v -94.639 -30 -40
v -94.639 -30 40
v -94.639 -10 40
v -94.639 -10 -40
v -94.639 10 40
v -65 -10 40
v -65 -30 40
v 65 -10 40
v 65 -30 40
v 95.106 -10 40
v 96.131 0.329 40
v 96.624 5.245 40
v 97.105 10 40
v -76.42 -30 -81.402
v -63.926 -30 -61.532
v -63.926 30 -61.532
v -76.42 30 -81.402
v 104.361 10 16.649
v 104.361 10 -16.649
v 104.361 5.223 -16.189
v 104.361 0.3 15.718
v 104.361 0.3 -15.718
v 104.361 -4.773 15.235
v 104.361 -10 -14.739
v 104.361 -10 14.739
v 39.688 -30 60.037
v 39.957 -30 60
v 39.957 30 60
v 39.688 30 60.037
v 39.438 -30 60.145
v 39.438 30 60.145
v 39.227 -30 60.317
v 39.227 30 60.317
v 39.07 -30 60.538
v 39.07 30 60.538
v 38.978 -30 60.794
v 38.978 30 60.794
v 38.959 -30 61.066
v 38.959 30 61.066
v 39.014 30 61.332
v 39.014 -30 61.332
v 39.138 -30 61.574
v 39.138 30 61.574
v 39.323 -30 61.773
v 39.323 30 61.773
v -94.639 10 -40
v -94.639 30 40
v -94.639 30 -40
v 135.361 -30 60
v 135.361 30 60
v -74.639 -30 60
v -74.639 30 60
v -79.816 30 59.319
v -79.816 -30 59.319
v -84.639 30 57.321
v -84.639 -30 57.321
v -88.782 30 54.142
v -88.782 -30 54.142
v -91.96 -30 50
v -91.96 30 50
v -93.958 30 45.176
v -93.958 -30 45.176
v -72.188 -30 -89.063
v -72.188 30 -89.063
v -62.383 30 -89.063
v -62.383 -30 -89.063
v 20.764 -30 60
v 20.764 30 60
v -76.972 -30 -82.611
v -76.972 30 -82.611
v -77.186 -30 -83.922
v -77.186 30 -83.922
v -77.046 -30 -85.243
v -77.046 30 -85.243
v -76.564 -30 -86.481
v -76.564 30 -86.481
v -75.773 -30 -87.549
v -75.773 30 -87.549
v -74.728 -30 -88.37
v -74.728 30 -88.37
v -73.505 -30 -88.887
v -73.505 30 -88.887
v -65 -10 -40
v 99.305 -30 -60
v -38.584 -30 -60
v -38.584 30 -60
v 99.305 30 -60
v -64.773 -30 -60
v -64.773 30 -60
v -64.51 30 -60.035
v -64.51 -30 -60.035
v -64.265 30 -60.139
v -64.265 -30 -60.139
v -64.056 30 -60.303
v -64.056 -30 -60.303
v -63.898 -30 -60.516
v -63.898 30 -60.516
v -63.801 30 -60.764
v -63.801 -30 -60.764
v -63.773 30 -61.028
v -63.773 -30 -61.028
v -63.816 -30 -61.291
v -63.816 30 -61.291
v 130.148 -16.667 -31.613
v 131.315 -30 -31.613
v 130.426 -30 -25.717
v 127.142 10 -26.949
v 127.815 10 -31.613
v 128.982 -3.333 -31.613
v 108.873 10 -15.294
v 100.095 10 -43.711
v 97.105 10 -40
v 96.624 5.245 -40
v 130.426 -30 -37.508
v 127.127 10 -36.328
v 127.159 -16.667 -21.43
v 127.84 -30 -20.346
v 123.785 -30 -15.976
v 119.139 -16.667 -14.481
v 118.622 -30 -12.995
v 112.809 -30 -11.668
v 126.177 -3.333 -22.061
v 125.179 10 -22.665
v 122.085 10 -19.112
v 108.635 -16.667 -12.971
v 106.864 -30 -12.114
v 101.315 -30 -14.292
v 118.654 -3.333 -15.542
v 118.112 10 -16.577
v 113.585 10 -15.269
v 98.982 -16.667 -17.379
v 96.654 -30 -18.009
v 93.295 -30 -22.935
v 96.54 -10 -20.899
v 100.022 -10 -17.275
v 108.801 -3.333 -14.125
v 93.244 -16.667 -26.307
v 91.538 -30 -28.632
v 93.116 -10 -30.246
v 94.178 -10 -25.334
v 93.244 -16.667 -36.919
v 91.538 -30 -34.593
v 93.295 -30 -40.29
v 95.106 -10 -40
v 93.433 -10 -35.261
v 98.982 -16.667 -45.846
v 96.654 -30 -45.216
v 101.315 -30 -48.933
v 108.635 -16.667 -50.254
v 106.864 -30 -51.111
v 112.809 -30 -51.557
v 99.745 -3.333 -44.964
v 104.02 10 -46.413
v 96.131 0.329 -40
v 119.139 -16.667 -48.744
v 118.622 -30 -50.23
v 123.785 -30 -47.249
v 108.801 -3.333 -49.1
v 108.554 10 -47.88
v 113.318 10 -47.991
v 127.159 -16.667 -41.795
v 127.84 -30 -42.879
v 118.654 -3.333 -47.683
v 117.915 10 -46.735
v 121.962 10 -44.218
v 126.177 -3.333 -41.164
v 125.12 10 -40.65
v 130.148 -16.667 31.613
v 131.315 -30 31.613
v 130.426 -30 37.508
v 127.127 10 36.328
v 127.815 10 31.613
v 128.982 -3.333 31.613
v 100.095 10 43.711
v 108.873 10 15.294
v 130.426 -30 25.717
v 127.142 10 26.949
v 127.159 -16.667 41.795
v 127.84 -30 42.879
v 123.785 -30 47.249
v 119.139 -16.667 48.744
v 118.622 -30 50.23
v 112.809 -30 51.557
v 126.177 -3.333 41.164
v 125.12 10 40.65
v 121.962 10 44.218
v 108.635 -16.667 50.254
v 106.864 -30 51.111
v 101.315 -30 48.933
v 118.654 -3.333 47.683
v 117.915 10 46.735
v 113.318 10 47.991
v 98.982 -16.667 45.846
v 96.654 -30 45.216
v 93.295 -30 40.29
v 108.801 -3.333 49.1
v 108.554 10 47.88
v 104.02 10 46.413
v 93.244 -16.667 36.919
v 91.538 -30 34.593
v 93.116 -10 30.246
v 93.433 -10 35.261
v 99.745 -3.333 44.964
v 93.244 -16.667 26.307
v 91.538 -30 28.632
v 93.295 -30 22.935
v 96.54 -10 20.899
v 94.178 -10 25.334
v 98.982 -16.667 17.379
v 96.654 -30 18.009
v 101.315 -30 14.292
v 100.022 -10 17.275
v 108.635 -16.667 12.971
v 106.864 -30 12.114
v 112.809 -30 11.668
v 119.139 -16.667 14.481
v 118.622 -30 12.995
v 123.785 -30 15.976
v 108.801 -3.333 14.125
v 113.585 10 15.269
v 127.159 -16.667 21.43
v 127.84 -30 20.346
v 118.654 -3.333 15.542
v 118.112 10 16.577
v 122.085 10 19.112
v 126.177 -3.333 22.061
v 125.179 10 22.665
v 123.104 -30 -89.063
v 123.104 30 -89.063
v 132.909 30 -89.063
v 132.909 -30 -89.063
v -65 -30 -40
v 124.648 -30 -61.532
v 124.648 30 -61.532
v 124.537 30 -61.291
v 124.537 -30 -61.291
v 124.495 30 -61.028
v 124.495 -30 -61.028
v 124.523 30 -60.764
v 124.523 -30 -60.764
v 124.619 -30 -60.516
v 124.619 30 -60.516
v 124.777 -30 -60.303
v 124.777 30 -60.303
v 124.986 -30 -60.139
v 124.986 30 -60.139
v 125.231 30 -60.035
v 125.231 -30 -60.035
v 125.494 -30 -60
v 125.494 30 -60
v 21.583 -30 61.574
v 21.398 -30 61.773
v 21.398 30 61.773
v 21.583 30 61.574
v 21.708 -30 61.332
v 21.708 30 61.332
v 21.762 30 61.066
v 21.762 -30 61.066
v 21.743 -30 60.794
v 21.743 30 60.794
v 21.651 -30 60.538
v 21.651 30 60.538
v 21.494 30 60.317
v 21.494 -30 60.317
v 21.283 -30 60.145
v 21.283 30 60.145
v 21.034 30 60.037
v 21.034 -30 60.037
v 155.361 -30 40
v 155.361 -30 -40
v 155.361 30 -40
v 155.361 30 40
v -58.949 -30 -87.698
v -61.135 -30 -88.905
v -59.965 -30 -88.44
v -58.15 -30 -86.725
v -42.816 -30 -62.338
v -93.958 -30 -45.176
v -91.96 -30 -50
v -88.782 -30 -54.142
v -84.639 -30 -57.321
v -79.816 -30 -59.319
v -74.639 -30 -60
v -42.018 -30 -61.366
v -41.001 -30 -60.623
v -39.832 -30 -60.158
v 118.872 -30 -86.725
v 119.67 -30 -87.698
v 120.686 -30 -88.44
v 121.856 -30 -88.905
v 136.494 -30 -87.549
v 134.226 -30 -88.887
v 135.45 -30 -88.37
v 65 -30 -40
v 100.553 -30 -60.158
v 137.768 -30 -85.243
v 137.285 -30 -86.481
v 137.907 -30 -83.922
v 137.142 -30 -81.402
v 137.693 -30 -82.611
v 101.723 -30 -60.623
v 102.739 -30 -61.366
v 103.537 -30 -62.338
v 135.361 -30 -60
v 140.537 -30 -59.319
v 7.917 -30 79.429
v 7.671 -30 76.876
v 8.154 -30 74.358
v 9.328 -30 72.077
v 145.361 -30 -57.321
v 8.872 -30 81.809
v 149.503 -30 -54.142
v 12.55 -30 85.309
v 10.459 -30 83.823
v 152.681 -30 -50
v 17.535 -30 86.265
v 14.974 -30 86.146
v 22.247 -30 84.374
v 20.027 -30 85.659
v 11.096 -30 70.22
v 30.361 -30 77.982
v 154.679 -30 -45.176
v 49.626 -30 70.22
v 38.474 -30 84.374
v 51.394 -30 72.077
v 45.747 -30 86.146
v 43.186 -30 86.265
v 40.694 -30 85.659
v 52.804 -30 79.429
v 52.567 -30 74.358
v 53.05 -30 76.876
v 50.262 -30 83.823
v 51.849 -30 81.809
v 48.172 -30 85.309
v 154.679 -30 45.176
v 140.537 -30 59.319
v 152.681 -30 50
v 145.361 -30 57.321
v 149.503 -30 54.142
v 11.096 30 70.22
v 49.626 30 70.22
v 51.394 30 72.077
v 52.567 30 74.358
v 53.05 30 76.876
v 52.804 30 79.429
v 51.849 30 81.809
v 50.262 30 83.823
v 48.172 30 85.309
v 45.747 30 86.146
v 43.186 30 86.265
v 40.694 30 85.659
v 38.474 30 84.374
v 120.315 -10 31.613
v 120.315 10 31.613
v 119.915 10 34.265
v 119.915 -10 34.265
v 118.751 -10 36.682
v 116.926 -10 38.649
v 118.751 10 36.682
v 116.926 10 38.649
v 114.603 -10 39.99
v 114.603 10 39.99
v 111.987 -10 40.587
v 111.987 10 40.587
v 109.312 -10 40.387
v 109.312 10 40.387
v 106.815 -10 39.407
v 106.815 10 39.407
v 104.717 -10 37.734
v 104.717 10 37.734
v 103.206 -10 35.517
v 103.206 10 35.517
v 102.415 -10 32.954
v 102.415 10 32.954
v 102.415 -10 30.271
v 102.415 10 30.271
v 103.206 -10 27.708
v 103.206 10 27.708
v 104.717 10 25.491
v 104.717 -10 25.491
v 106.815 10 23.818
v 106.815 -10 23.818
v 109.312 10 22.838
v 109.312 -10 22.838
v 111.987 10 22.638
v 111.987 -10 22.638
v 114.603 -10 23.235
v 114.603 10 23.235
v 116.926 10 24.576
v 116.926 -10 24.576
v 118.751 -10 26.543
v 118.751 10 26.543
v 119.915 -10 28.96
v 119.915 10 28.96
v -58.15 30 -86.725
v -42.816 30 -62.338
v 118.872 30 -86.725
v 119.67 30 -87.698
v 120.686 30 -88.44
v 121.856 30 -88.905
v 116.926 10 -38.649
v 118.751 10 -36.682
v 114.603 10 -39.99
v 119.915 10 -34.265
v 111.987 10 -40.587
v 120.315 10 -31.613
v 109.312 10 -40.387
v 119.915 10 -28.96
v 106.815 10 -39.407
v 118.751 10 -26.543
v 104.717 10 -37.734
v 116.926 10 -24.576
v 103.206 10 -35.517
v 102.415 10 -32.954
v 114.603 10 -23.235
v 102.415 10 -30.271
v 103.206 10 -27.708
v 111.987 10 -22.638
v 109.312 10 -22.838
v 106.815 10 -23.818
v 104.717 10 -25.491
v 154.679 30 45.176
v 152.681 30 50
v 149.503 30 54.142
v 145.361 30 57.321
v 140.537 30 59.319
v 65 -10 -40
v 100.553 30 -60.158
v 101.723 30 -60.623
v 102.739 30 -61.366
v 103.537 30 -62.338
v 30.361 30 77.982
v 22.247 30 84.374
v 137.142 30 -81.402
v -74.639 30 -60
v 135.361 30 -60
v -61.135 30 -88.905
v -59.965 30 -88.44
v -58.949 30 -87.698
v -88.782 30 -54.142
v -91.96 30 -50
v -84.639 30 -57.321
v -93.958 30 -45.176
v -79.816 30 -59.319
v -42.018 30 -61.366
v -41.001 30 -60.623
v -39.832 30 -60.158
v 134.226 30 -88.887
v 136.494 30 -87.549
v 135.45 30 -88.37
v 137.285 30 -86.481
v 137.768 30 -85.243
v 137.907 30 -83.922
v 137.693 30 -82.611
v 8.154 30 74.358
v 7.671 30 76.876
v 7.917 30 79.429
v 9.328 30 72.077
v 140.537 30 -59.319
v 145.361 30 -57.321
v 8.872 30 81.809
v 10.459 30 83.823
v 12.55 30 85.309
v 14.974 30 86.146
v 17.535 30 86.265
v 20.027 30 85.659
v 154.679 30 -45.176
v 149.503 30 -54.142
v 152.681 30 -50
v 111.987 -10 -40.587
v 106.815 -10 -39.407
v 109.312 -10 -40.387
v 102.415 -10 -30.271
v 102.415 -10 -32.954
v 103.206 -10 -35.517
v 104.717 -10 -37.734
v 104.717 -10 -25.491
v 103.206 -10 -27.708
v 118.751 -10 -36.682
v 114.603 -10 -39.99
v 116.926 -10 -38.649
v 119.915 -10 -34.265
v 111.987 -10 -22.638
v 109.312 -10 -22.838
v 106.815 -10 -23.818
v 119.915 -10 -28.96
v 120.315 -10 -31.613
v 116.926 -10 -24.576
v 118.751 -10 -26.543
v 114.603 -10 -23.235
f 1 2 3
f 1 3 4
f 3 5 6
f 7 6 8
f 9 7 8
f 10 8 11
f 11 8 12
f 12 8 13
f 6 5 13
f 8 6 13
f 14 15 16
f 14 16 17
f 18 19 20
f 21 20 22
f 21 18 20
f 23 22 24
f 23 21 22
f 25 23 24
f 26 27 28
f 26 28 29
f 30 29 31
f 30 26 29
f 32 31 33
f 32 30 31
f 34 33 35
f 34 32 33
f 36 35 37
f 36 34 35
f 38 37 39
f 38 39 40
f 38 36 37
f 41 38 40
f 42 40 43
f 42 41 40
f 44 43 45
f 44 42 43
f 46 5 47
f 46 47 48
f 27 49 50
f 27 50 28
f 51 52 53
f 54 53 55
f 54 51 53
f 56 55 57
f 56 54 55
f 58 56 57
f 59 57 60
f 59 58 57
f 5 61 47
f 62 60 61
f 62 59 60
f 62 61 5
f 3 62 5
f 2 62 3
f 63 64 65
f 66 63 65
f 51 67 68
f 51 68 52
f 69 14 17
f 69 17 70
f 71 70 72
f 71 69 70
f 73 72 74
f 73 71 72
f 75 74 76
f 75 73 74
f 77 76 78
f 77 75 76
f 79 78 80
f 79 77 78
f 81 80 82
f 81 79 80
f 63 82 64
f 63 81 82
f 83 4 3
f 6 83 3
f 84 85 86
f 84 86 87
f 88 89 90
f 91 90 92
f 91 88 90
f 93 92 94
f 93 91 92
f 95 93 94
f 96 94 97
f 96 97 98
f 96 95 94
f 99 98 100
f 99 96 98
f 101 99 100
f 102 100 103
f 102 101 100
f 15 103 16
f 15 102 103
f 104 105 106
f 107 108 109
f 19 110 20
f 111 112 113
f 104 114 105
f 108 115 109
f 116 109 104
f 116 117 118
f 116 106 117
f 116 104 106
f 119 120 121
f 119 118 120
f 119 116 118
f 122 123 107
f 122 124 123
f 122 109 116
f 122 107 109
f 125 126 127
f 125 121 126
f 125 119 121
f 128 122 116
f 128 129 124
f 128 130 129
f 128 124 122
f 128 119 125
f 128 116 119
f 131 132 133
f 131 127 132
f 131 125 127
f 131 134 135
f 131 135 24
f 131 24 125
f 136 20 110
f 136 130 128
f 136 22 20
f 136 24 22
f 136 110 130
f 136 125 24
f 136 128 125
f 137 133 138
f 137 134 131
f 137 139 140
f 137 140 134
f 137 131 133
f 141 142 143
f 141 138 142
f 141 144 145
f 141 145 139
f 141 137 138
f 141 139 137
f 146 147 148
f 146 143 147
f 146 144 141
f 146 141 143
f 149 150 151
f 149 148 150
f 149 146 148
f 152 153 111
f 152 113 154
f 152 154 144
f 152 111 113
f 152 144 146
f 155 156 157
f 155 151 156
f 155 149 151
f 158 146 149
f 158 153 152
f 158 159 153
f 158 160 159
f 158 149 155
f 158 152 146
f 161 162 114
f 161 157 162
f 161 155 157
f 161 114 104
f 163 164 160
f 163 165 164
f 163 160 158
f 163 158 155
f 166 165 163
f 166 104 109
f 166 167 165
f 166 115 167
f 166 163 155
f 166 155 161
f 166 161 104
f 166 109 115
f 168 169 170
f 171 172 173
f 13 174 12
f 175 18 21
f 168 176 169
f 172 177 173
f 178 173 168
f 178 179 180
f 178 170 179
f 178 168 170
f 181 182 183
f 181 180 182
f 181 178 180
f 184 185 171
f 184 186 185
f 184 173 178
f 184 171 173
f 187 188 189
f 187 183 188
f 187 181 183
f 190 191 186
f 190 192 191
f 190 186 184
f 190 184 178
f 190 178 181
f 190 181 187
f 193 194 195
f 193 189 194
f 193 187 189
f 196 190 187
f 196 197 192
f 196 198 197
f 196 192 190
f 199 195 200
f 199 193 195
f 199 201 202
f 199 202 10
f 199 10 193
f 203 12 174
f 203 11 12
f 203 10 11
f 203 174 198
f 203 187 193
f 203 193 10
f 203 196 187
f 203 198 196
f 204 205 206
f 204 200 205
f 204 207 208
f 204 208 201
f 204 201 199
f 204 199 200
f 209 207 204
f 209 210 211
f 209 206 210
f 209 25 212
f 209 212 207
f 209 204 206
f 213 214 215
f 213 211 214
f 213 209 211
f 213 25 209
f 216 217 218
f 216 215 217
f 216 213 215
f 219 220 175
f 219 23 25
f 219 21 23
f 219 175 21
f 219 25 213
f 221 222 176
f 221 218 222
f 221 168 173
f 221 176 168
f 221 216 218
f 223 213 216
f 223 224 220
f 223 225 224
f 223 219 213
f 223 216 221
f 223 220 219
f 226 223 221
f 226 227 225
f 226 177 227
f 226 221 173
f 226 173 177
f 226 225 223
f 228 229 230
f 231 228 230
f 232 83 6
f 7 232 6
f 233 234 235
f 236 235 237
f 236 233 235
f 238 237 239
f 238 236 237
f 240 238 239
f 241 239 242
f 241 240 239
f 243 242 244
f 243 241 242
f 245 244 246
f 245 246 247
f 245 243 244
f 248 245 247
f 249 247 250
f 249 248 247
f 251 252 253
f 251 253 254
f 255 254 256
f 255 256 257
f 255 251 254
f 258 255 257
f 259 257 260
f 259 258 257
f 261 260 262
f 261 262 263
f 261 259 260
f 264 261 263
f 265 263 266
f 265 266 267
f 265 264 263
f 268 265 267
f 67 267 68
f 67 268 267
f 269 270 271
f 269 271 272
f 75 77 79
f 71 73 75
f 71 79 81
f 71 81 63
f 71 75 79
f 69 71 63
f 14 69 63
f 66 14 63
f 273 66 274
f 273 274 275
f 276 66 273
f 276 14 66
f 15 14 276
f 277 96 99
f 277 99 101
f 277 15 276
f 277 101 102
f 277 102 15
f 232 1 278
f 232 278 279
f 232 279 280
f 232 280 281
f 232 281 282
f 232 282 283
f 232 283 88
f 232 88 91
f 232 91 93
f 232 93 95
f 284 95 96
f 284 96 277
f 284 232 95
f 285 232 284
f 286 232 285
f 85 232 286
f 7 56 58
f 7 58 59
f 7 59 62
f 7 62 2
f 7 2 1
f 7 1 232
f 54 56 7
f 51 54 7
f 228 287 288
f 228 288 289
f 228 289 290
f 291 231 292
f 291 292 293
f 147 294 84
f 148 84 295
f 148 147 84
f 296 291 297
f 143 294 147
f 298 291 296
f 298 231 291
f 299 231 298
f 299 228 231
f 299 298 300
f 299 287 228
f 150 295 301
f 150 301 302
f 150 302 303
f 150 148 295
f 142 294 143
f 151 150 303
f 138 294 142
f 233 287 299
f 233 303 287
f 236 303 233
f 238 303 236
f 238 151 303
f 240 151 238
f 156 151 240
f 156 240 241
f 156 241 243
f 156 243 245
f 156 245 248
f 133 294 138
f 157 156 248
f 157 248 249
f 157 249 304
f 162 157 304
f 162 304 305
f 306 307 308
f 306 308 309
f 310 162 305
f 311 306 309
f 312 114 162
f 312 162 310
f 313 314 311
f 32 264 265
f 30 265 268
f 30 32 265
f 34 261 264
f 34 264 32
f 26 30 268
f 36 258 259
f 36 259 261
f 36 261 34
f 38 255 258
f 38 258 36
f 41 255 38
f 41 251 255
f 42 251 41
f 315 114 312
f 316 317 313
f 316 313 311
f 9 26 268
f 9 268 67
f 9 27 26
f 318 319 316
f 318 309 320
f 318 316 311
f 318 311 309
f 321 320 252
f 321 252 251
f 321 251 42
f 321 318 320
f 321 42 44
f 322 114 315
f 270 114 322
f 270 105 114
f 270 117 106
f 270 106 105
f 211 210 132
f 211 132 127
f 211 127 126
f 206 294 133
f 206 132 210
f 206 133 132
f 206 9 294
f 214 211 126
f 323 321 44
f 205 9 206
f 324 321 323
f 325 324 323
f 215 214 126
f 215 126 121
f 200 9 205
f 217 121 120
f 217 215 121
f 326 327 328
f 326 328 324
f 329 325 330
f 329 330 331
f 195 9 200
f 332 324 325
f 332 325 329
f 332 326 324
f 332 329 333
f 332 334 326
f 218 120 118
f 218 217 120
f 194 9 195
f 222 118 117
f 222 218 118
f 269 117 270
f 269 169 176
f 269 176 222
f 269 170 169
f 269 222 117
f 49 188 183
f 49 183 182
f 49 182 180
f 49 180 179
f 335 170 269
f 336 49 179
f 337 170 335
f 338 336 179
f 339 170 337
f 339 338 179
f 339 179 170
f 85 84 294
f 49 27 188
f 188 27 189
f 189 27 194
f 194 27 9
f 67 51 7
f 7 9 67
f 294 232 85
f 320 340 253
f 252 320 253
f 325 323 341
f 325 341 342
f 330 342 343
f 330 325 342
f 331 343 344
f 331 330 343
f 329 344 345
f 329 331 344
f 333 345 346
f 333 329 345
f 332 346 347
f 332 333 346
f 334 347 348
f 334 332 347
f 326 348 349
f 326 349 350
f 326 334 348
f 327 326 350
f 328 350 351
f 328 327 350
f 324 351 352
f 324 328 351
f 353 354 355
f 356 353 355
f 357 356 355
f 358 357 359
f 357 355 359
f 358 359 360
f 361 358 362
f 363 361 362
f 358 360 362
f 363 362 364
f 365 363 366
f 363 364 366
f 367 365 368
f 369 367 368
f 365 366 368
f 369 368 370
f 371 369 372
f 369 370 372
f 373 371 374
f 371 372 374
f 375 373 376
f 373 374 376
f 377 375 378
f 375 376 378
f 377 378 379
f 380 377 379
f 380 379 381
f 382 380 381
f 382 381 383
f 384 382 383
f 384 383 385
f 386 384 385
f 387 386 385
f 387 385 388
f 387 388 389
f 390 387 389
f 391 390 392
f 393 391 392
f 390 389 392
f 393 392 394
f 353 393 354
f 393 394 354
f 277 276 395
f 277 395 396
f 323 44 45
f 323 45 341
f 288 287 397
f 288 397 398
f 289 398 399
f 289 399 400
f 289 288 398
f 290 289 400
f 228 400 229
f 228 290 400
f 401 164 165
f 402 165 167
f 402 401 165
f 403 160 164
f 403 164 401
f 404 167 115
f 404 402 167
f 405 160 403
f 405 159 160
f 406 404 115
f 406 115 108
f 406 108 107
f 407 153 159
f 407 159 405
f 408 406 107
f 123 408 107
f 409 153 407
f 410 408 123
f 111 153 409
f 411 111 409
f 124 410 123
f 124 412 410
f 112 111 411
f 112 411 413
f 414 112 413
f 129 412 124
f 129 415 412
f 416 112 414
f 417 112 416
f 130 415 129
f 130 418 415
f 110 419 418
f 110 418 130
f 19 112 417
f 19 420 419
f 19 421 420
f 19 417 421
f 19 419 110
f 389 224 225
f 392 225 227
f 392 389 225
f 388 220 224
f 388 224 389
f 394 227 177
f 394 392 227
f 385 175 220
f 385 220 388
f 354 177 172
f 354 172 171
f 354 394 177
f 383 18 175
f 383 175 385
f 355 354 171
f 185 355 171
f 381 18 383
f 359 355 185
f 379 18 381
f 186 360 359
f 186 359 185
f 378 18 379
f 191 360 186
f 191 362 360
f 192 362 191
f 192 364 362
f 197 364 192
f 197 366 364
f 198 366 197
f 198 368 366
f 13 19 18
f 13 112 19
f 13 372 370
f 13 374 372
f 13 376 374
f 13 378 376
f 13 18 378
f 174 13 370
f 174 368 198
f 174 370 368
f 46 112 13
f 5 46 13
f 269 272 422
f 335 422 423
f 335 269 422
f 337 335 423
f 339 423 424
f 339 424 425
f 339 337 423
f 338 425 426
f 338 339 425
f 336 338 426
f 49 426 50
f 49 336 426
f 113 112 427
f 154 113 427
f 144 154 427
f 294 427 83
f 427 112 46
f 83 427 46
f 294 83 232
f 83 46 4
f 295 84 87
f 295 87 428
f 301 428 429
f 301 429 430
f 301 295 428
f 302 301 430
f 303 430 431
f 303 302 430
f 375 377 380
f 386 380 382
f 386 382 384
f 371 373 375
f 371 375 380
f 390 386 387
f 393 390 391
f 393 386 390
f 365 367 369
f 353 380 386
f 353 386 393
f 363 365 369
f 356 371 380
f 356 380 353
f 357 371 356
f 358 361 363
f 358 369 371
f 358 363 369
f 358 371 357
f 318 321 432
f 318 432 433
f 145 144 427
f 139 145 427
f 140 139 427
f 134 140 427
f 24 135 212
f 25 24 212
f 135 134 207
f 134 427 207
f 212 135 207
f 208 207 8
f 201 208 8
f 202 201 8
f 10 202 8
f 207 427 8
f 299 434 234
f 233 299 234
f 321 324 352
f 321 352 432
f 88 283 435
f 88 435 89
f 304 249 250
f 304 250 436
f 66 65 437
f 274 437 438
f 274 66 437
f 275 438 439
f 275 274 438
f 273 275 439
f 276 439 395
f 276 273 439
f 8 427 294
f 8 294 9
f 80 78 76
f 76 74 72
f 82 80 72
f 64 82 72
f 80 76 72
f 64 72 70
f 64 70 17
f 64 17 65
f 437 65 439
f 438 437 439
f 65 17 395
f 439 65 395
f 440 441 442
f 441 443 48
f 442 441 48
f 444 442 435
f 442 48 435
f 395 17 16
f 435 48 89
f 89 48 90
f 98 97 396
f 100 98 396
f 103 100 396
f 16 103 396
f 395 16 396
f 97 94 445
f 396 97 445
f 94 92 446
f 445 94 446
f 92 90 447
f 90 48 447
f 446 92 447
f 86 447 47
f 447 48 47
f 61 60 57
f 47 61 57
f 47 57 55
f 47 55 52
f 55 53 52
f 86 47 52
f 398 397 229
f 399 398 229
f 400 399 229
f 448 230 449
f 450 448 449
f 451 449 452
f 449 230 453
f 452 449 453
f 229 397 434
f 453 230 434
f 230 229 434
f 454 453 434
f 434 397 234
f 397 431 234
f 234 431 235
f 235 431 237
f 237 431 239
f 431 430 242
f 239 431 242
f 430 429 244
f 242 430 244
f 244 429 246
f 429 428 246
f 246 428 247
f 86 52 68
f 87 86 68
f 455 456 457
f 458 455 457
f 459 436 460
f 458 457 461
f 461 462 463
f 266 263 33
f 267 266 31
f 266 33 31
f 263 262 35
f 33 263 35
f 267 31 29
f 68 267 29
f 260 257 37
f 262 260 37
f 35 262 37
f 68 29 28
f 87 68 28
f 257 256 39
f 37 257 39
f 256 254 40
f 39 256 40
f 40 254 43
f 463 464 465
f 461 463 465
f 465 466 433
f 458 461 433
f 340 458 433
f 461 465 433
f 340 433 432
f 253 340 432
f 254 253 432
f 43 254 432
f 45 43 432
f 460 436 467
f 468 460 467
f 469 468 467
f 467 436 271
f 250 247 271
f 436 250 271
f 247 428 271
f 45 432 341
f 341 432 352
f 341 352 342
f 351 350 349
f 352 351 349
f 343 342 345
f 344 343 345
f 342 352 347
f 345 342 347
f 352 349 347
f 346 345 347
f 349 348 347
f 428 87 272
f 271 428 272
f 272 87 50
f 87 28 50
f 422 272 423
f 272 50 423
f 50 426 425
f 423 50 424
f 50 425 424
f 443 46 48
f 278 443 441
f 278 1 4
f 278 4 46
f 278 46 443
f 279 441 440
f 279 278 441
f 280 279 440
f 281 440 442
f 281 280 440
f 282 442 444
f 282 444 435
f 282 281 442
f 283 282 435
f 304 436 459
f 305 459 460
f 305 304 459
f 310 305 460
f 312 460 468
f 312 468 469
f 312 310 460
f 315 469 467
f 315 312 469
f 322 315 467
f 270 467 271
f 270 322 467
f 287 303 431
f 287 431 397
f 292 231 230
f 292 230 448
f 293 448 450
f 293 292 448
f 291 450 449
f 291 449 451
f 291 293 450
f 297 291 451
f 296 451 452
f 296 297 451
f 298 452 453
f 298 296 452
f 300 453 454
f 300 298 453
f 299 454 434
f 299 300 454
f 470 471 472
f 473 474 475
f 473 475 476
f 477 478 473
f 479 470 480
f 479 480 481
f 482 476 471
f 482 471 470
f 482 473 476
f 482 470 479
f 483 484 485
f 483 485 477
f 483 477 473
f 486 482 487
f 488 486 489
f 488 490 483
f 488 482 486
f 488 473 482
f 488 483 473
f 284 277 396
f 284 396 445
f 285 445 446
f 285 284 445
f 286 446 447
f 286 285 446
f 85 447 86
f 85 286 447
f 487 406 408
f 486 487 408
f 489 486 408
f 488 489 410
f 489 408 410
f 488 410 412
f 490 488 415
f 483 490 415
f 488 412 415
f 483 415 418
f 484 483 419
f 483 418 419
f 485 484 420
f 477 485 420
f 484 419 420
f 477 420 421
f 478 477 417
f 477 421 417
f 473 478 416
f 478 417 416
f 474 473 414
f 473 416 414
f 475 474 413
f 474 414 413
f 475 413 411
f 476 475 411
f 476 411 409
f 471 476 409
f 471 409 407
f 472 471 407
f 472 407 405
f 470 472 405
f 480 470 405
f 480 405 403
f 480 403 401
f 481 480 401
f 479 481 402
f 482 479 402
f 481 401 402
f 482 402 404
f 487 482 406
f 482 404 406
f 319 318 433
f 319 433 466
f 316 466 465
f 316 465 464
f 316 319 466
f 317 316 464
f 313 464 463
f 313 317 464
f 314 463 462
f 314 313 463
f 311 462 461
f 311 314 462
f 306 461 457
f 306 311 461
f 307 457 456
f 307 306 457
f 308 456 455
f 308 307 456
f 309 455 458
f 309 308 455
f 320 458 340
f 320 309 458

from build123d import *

# Parameters (mm, degrees)
F3_DEPTH  = 30
F4_W      = 20
F4_H      = 80
F5_DEPTH  = 199
F6_R      = 20
F7_DEPTH  = 40
F7_TAPER  = 5
F0_W      = 130
F0_H      = 80
F8_DEPTH  = 43
F9_R      = 9
F10_DEPTH = 20


with BuildPart() as f3:
    # F2 (on Front) → F3 (new body, symmetric)
    with BuildSketch(Plane.XZ):
        with BuildLine():
            ThreePointArc((-94.639390707, -40), (-88.7815263307, -54.1421356237), (-74.639390707, -60))
            Line((-74.639390707, -60), (-64.7730480564, -60))
            ThreePointArc((-64.7730480564, -60), (-63.8977460335, -60.5164233581), (-63.9264968306, -61.5323072629))
            Line((-63.9264968306, -61.5323072629), (-76.4204092514, -81.4019156883))
            ThreePointArc((-76.4204092514, -81.4019156883), (-76.5641632373, -86.481335212), (-72.1876531224, -89.0634520026))
            Line((-72.1876531224, -89.0634520026), (-62.3831424536, -89.0634520026))
            ThreePointArc((-62.3831424536, -89.0634520026), (-59.9652592442, -88.4399621175), (-58.1503863246, -86.7249883169))
            Line((-58.1503863246, -86.7249883169), (-42.8162591257, -62.3384636857))
            ThreePointArc((-42.8162591257, -62.3384636857), (-41.0013862061, -60.6234898851), (-38.5835029967, -60))
            Line((-38.5835029967, -60), (99.3047215826, -60))
            ThreePointArc((99.3047215826, -60), (101.7226047921, -60.6234898851), (103.5374777117, -62.3384636857))
            Line((103.5374777117, -62.3384636857), (118.8716049106, -86.7249883169))
            ThreePointArc((118.8716049106, -86.7249883169), (120.6864778302, -88.4399621175), (123.1043610396, -89.0634520026))
            Line((123.1043610396, -89.0634520026), (132.9088717083, -89.0634520026))
            ThreePointArc((132.9088717083, -89.0634520026), (137.2853818232, -86.481335212), (137.1416278374, -81.4019156883))
            Line((137.1416278374, -81.4019156883), (124.6477154166, -61.5323072629))
            ThreePointArc((124.6477154166, -61.5323072629), (124.6189646194, -60.5164233581), (125.4942666424, -60))
            Line((125.4942666424, -60), (135.360609293, -60))
            ThreePointArc((135.360609293, -60), (149.5027449167, -54.1421356237), (155.360609293, -40))
            Line((155.360609293, -40), (155.360609293, 40))
            ThreePointArc((155.360609293, 40), (149.5027449167, 54.1421356237), (135.360609293, 60))
            Line((135.360609293, 60), (39.9569445726, 60))
            ThreePointArc((39.9569445726, 60), (39.0153160887, 60.6633461743), (39.3229389096, 61.7733284033))
            Line((39.3229389096, 61.7733284033), (49.6255289763, 70.2198052406))
            ThreePointArc((49.6255289763, 70.2198052406), (51.1272936037, 82.8727111049), (38.4743877395, 84.3744757323))
            Line((38.4743877395, 84.3744757323), (30.360609293, 77.9823884368))
            Line((30.360609293, 77.9823884368), (22.2468308465, 84.3744757323))
            ThreePointArc((22.2468308465, 84.3744757323), (9.5939249823, 82.8727111049), (11.0956896096, 70.2198052406))
            Line((11.0956896096, 70.2198052406), (21.3982796764, 61.7733284033))
            ThreePointArc((21.3982796764, 61.7733284033), (21.7059024972, 60.6633461743), (20.7642740134, 60))
            Line((20.7642740134, 60), (-74.639390707, 60))
            ThreePointArc((-74.639390707, 60), (-88.7815263307, 54.1421356237), (-94.639390707, 40))
            Line((-94.639390707, 40), (-94.639390707, -40))
        make_face()
    extrude(amount=F3_DEPTH, both=True)

    # F4 (on face) → F5 (cut)
    with BuildSketch(Plane(origin=(-94.639390707, 0, 0), x_dir=(0, -1, 0), z_dir=(-1, 0, 0))):
        Rectangle(F4_W, F4_H)
    extrude(amount=-F5_DEPTH, mode=Mode.SUBTRACT)

    # F6 (on face) → F7 (cut)
    with BuildSketch(Plane.XZ.offset(30)):
        with Locations((111.3148257136, 31.6125191748)):
            Circle(F6_R)
        with Locations((111.3148257136, -31.6125191748)):
            Circle(F6_R)
    extrude(amount=-F7_DEPTH, taper=F7_TAPER, mode=Mode.SUBTRACT)

    # F0 (on Front) → F8 (cut)
    with BuildSketch(Plane.XZ):
        Rectangle(F0_W, F0_H)
    extrude(amount=F8_DEPTH, mode=Mode.SUBTRACT)

    # F9 (on face) → F10 (join)
    with BuildSketch(Plane.XZ.offset(-10)):
        with Locations((111.3148257136, 31.6125191748)):
            Circle(F9_R)
        with Locations((111.3148257136, -31.6125191748)):
            Circle(F9_R)
    extrude(amount=F10_DEPTH)


solid = f3.part
